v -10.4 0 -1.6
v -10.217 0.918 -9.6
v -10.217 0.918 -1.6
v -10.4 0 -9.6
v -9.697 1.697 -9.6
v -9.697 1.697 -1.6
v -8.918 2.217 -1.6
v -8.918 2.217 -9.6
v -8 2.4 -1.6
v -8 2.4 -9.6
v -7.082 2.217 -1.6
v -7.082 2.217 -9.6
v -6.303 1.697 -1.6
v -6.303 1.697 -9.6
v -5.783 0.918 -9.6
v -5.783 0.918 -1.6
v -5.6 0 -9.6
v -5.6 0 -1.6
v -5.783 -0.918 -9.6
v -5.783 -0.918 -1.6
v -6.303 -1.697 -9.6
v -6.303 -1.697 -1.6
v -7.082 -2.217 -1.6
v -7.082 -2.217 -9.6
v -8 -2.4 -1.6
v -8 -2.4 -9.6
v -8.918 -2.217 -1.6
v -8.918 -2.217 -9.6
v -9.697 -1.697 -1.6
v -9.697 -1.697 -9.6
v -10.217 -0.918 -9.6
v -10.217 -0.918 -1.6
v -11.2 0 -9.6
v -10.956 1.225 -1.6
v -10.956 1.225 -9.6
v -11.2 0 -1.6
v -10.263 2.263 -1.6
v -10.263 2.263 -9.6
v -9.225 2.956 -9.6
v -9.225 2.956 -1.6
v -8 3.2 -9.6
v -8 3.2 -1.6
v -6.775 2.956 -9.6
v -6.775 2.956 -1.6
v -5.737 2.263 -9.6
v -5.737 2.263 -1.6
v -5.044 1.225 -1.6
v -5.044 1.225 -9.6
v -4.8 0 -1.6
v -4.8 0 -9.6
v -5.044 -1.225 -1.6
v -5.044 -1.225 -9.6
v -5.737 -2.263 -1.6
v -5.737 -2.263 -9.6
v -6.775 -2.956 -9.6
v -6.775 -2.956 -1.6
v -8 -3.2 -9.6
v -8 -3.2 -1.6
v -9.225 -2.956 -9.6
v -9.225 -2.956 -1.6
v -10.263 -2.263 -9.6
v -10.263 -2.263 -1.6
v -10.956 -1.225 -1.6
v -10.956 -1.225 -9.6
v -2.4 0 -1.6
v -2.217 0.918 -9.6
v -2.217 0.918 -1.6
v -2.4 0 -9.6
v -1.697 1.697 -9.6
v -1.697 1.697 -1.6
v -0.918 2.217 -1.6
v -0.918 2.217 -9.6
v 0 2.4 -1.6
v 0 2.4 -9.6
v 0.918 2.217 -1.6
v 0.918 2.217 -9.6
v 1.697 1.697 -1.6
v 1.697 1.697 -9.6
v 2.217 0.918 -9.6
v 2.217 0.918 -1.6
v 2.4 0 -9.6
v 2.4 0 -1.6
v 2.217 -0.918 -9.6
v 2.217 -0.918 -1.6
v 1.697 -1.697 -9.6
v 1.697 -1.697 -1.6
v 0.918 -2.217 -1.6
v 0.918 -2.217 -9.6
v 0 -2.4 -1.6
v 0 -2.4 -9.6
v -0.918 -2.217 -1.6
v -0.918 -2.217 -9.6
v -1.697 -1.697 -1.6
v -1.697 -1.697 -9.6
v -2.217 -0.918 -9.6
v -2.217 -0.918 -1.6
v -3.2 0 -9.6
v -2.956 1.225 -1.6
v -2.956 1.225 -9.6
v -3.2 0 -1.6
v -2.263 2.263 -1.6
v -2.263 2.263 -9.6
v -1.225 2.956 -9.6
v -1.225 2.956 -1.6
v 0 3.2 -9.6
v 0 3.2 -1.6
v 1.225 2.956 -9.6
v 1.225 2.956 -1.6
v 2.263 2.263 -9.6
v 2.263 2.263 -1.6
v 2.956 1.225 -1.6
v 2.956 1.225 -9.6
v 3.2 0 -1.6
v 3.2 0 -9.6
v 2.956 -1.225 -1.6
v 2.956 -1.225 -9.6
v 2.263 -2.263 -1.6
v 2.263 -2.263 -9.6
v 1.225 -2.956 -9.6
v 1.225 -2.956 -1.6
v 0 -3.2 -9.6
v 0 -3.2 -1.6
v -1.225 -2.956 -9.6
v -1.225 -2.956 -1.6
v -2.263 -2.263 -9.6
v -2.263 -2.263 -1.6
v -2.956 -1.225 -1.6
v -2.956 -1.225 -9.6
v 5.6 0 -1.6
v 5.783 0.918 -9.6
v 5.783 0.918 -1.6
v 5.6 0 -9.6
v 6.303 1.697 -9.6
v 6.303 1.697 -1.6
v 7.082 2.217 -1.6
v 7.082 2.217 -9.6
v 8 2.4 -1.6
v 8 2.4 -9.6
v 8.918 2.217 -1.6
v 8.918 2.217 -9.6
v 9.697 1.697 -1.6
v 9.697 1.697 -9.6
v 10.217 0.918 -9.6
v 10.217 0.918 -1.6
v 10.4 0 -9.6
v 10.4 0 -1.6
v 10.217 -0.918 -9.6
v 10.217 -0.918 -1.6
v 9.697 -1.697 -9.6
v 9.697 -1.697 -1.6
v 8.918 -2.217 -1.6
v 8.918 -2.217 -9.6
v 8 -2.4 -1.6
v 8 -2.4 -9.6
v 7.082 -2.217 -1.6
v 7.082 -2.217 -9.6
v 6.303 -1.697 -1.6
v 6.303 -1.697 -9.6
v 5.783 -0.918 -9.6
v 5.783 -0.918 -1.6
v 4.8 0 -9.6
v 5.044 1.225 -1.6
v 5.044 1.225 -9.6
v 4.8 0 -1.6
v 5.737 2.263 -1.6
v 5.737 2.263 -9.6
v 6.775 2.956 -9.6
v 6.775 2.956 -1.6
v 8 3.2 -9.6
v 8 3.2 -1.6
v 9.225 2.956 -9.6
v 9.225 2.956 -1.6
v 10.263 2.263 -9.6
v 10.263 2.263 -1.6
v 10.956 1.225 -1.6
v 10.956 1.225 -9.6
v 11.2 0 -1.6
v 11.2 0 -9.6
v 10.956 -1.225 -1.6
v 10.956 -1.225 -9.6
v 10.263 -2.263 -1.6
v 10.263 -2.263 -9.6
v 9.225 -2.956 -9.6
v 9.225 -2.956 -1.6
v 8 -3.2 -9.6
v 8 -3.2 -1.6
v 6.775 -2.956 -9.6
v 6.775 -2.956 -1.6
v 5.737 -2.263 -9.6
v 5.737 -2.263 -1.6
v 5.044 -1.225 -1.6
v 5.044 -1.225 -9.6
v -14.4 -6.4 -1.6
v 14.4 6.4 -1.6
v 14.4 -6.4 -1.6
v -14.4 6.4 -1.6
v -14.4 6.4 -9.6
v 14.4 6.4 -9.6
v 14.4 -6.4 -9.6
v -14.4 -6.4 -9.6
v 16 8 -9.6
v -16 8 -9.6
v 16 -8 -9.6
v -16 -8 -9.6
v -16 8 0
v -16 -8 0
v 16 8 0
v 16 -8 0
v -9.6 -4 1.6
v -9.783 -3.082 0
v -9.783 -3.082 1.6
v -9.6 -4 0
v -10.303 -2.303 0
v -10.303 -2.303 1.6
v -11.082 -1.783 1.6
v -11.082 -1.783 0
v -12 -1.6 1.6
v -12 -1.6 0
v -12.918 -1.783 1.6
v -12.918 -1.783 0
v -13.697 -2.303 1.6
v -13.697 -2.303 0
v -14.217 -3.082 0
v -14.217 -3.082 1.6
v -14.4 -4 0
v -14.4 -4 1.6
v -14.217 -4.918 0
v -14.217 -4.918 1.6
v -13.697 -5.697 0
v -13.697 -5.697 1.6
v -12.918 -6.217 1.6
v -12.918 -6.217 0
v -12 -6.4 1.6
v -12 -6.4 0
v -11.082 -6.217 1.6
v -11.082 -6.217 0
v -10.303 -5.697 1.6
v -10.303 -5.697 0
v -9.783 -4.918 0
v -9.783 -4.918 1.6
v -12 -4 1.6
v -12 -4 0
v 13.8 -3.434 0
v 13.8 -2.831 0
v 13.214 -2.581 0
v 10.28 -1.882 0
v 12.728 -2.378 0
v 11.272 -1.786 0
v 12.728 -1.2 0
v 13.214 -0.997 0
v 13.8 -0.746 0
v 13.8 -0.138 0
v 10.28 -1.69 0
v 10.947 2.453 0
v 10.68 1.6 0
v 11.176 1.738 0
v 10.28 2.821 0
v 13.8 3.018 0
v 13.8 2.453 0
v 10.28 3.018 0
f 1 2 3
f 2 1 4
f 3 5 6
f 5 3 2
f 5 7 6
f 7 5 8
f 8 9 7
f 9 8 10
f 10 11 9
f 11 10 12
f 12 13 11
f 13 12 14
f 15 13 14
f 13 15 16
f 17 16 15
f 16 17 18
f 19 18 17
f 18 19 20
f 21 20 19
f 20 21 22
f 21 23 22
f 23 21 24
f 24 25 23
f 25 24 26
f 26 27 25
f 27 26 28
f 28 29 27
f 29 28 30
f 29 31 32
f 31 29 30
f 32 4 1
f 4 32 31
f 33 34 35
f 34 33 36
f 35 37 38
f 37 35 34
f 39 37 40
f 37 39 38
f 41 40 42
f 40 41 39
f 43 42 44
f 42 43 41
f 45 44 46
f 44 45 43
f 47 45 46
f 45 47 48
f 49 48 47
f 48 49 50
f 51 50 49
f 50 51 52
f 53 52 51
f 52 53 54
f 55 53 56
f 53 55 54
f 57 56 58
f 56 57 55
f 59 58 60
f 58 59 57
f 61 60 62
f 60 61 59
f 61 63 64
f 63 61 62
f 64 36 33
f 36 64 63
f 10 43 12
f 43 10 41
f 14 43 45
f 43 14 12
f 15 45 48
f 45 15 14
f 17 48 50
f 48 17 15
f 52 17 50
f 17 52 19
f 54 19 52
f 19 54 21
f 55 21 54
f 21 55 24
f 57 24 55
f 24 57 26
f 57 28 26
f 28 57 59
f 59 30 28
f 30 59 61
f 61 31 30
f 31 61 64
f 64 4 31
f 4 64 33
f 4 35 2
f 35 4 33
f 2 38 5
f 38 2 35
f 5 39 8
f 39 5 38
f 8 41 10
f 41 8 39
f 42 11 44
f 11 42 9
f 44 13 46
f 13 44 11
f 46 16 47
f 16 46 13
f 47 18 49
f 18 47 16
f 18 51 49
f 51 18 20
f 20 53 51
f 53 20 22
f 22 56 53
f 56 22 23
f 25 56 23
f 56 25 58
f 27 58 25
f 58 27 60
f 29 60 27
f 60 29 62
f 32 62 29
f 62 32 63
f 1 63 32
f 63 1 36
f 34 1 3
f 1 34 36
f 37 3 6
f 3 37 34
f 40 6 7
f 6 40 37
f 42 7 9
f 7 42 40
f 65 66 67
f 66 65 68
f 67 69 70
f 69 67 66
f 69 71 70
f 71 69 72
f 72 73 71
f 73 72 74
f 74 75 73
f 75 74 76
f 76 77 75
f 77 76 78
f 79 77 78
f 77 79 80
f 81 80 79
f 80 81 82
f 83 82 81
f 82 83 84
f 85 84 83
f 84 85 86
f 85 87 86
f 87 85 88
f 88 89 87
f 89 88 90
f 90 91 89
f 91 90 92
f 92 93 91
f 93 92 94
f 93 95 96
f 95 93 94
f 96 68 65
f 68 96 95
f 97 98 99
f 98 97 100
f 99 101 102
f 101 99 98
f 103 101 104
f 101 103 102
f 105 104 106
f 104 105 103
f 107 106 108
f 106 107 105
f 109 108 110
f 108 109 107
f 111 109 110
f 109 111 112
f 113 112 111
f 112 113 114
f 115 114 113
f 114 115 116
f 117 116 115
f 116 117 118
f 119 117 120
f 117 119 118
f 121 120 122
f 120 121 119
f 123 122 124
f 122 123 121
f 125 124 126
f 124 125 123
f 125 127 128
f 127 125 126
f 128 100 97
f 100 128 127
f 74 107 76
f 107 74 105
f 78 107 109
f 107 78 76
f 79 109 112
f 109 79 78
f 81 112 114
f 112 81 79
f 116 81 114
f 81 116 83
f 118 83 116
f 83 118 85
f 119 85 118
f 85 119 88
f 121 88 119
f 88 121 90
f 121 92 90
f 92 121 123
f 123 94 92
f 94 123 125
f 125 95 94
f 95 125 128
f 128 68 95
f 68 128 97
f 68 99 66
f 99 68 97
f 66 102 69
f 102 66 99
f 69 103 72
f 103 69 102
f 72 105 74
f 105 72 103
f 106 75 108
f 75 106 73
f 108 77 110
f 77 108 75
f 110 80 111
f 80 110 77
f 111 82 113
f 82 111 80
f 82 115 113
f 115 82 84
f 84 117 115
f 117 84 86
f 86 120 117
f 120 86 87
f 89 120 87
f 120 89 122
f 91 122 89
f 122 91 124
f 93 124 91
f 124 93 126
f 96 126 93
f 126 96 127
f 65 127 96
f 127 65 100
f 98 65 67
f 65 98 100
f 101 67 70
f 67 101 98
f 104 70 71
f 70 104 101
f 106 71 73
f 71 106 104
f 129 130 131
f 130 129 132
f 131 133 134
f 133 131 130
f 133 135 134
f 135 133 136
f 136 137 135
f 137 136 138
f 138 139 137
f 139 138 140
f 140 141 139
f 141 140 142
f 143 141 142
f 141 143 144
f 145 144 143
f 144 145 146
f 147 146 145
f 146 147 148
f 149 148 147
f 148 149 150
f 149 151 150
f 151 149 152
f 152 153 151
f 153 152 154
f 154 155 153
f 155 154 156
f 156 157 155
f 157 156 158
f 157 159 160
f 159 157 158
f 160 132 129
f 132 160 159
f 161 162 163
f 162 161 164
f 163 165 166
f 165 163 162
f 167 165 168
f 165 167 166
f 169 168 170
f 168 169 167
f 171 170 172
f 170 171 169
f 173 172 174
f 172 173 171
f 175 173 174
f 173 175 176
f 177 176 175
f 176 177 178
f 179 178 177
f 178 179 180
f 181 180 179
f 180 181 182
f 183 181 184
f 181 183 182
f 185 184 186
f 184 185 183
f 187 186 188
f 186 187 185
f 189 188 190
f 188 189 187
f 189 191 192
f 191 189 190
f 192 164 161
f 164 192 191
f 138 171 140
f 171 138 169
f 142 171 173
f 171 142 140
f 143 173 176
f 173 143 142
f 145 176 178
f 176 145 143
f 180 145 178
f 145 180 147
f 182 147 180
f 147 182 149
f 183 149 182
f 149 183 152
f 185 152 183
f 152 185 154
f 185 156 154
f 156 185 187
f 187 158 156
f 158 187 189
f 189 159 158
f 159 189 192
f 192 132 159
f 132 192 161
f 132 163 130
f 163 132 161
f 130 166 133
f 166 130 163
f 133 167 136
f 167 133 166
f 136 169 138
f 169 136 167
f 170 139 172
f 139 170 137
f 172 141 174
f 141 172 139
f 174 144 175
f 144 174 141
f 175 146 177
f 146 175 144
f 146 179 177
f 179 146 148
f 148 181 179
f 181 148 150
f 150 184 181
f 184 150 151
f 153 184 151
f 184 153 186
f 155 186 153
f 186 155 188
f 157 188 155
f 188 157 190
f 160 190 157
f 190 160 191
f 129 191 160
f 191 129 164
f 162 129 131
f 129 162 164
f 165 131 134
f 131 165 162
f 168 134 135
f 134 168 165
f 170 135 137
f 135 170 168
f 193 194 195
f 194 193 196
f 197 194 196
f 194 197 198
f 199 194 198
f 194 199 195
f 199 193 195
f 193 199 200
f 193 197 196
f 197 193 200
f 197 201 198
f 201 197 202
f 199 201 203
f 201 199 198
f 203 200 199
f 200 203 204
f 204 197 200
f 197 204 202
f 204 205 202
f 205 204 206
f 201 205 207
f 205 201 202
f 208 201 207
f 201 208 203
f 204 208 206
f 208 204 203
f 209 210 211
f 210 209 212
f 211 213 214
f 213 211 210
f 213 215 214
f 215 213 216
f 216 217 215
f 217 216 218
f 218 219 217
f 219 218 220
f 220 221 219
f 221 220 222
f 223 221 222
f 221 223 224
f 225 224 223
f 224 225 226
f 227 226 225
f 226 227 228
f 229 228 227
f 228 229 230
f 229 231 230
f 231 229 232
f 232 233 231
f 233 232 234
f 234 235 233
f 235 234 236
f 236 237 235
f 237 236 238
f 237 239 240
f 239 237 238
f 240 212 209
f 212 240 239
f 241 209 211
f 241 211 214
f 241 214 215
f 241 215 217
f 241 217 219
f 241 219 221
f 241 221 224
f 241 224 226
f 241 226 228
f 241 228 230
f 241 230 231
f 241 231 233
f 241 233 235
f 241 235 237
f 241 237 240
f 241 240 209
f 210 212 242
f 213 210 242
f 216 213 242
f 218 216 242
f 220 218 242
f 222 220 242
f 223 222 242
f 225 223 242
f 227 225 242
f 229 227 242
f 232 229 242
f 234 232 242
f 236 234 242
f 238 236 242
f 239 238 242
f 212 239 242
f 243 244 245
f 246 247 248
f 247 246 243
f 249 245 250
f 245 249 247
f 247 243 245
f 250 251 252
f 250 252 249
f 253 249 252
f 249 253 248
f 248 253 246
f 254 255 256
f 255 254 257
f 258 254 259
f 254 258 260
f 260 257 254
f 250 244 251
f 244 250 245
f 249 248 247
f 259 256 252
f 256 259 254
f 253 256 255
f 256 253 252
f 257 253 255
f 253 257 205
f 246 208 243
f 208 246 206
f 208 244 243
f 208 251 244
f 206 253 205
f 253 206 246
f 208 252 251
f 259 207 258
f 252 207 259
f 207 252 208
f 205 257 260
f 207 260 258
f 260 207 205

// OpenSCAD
// file: ../p/4-4ring3.scad
use <../lib.scad>
$fa=1; $fs=0.2;
function ldraw_lib__4_4ring3(realsolid=false) = [
// 0 Ring  3 x 1.0
// 0 Name: 4-4ring3.dat
// 0 Author: James Jessiman
// 0 !LDRAW_ORG Primitive UPDATE 2009-01
// 0 !LICENSE Licensed under CC BY 2.0 and CC BY 4.0 : see CAreadme.txt
// 
// 0 BFC CERTIFY CCW
  [0,"BFC","CERTIFY"],
  [0,"BFC","CCW"],
// 
// 0 !HISTORY 1998-12-15 [PTadmin] Official Update 1998-10
// 0 !HISTORY 2002-04-05 [hafhead] Added BFC statement
// 0 !HISTORY 2002-04-25 [PTadmin] Official Update 2002-02
// 0 !HISTORY 2007-06-24 [PTadmin] Header formatted for Contributor Agreement
// 0 !HISTORY 2008-07-01 [PTadmin] Official Update 2008-01
// 0 !HISTORY 2008-08-26 [cwdee] Switch polygon winding and rename
// 0 !HISTORY 2009-05-02 [PTadmin] Official Update 2009-01
// 
// 
// 4 16 -1.5308 0 3.6956 -1.1481 0 2.7717 0 0 3 0 0 4
  [4,16,-1.5308,0,3.6956,-1.1481,0,2.7717,0,0,3,0,0,4],
// 4 16 -2.8284 0 2.8284 -2.1213 0 2.1213 -1.1481 0 2.7717 -1.5308 0 3.6956
  [4,16,-2.8284,0,2.8284,-2.1213,0,2.1213,-1.1481,0,2.7717,-1.5308,0,3.6956],
// 4 16 -3.6956 0 1.5308 -2.7717 0 1.1481 -2.1213 0 2.1213 -2.8284 0 2.8284
  [4,16,-3.6956,0,1.5308,-2.7717,0,1.1481,-2.1213,0,2.1213,-2.8284,0,2.8284],
// 4 16 -4 0 0 -3 0 0 -2.7717 0 1.1481 -3.6956 0 1.5308
  [4,16,-4,0,0,-3,0,0,-2.7717,0,1.1481,-3.6956,0,1.5308],
// 4 16 -3.6956 0 -1.5308 -2.7717 0 -1.1481 -3 0 0 -4 0 0
  [4,16,-3.6956,0,-1.5308,-2.7717,0,-1.1481,-3,0,0,-4,0,0],
// 4 16 -2.8284 0 -2.8284 -2.1213 0 -2.1213 -2.7717 0 -1.1481 -3.6956 0 -1.5308
  [4,16,-2.8284,0,-2.8284,-2.1213,0,-2.1213,-2.7717,0,-1.1481,-3.6956,0,-1.5308],
// 4 16 -1.5308 0 -3.6956 -1.1481 0 -2.7717 -2.1213 0 -2.1213 -2.8284 0 -2.8284
  [4,16,-1.5308,0,-3.6956,-1.1481,0,-2.7717,-2.1213,0,-2.1213,-2.8284,0,-2.8284],
// 4 16 0 0 -4 0 0 -3 -1.1481 0 -2.7717 -1.5308 0 -3.6956
  [4,16,0,0,-4,0,0,-3,-1.1481,0,-2.7717,-1.5308,0,-3.6956],
// 4 16 1.5308 0 -3.6956 1.1481 0 -2.7717 0 0 -3 0 0 -4
  [4,16,1.5308,0,-3.6956,1.1481,0,-2.7717,0,0,-3,0,0,-4],
// 4 16 2.8284 0 -2.8284 2.1213 0 -2.1213 1.1481 0 -2.7717 1.5308 0 -3.6956
  [4,16,2.8284,0,-2.8284,2.1213,0,-2.1213,1.1481,0,-2.7717,1.5308,0,-3.6956],
// 4 16 3.6956 0 -1.5308 2.7717 0 -1.1481 2.1213 0 -2.1213 2.8284 0 -2.8284
  [4,16,3.6956,0,-1.5308,2.7717,0,-1.1481,2.1213,0,-2.1213,2.8284,0,-2.8284],
// 4 16 4 0 0 3 0 0 2.7717 0 -1.1481 3.6956 0 -1.5308
  [4,16,4,0,0,3,0,0,2.7717,0,-1.1481,3.6956,0,-1.5308],
// 4 16 3.6956 0 1.5308 2.7717 0 1.1481 3 0 0 4 0 0
  [4,16,3.6956,0,1.5308,2.7717,0,1.1481,3,0,0,4,0,0],
// 4 16 2.8284 0 2.8284 2.1213 0 2.1213 2.7717 0 1.1481 3.6956 0 1.5308
  [4,16,2.8284,0,2.8284,2.1213,0,2.1213,2.7717,0,1.1481,3.6956,0,1.5308],
// 4 16 1.5308 0 3.6956 1.1481 0 2.7717 2.1213 0 2.1213 2.8284 0 2.8284
  [4,16,1.5308,0,3.6956,1.1481,0,2.7717,2.1213,0,2.1213,2.8284,0,2.8284],
// 4 16 0 0 4 0 0 3 1.1481 0 2.7717 1.5308 0 3.6956
  [4,16,0,0,4,0,0,3,1.1481,0,2.7717,1.5308,0,3.6956],
// 0
];
module ldraw_lib__4_4ring3(step=0, col=false, unit=2/5, alt=false, line=0.2, solid=!$preview)
    makepoly(ldraw_lib__4_4ring3(solid), step=step, col=col, unit=unit, alt=alt, line=line, solid=solid);
ldraw_lib__4_4ring3(line=0.2);
// file: ../p/4-4edge.scad
use <../lib.scad>
function ldraw_lib__4_4edge() = [
// 0 Circle 1.0
// 0 Name: 4-4edge.dat
// 0 Author: James Jessiman
// 0 !LDRAW_ORG Primitive UPDATE 2017-01
// 0 !LICENSE Licensed under CC BY 2.0 and CC BY 4.0 : see CAreadme.txt
// 
// 0 BFC CERTIFY CCW
  [0,"BFC","CERTIFY"],
  [0,"BFC","CCW"],
// 
// 0 !HISTORY 1998-12-15 [PTadmin] Official Update 1998-10
// 0 !HISTORY 2005-12-28 [PTadmin] Official Update 2005-01
// 0 !HISTORY 2007-06-24 [PTadmin] Header formatted for Contributor Agreement
// 0 !HISTORY 2008-07-01 [PTadmin] Official Update 2008-01
// 0 !HISTORY 2017-01-15 [Steffen] BFCed
// 0 !HISTORY 2017-12-30 [PTadmin] Official Update 2017-01
// 
// 
// 2 24 1 0 0 0.9239 0 0.3827
  [2,24,1,0,0,0.9239,0,0.3827],
// 2 24 0.9239 0 0.3827 0.7071 0 0.7071
  [2,24,0.9239,0,0.3827,0.7071,0,0.7071],
// 2 24 0.7071 0 0.7071 0.3827 0 0.9239
  [2,24,0.7071,0,0.7071,0.3827,0,0.9239],
// 2 24 0.3827 0 0.9239 0 0 1
  [2,24,0.3827,0,0.9239,0,0,1],
// 2 24 0 0 1 -0.3827 0 0.9239
  [2,24,0,0,1,-0.3827,0,0.9239],
// 2 24 -0.3827 0 0.9239 -0.7071 0 0.7071
  [2,24,-0.3827,0,0.9239,-0.7071,0,0.7071],
// 2 24 -0.7071 0 0.7071 -0.9239 0 0.3827
  [2,24,-0.7071,0,0.7071,-0.9239,0,0.3827],
// 2 24 -0.9239 0 0.3827 -1 0 -0
  [2,24,-0.9239,0,0.3827,-1,0,-0],
// 2 24 -1 0 -0 -0.9239 0 -0.3827
  [2,24,-1,0,-0,-0.9239,0,-0.3827],
// 2 24 -0.9239 0 -0.3827 -0.7071 0 -0.7071
  [2,24,-0.9239,0,-0.3827,-0.7071,0,-0.7071],
// 2 24 -0.7071 0 -0.7071 -0.3827 0 -0.9239
  [2,24,-0.7071,0,-0.7071,-0.3827,0,-0.9239],
// 2 24 -0.3827 0 -0.9239 0 0 -1
  [2,24,-0.3827,0,-0.9239,0,0,-1],
// 2 24 0 0 -1 0.3827 0 -0.9239
  [2,24,0,0,-1,0.3827,0,-0.9239],
// 2 24 0.3827 0 -0.9239 0.7071 0 -0.7071
  [2,24,0.3827,0,-0.9239,0.7071,0,-0.7071],
// 2 24 0.7071 0 -0.7071 0.9239 0 -0.3827
  [2,24,0.7071,0,-0.7071,0.9239,0,-0.3827],
// 2 24 0.9239 0 -0.3827 1 0 0
  [2,24,0.9239,0,-0.3827,1,0,0],
];
module ldraw_lib__4_4edge(step=0, col=false, unit=2/5, alt=false, line=0.2, solid=!$preview)
    makepoly(ldraw_lib__4_4edge(), step=step, col=col, unit=unit, alt=alt, line=line, solid=solid);
ldraw_lib__4_4edge(line=0.2);
// file: ../p/4-4disc.scad
use <../lib.scad>
function ldraw_lib__4_4disc() = [
// 0 Disc 1.0
// 0 Name: 4-4disc.dat
// 0 Author: James Jessiman
// 0 !LDRAW_ORG Primitive UPDATE 2002-02
// 0 !LICENSE Licensed under CC BY 2.0 and CC BY 4.0 : see CAreadme.txt
// 
// 0 BFC CERTIFY CCW
  [0,"BFC","CERTIFY"],
  [0,"BFC","CCW"],
// 
// 0 !HISTORY 1998-12-15 [PTadmin] Official Update 1998-10
// 0 !HISTORY 2002-03-23 [sbliss] Added BFC statement
// 0 !HISTORY 2002-04-25 [PTadmin] Official Update 2002-02
// 0 !HISTORY 2007-06-24 [PTadmin] Header formatted for Contributor Agreement
// 0 !HISTORY 2008-07-01 [PTadmin] Official Update 2008-01
// 
// 
// 3 16 0 0 0 1 0 0 0.9239 0 0.3827
  [3,16,0,0,0,1,0,0,0.9239,0,0.3827],
// 3 16 0 0 0 0.9239 0 0.3827 0.7071 0 0.7071
  [3,16,0,0,0,0.9239,0,0.3827,0.7071,0,0.7071],
// 3 16 0 0 0 0.7071 0 0.7071 0.3827 0 0.9239
  [3,16,0,0,0,0.7071,0,0.7071,0.3827,0,0.9239],
// 3 16 0 0 0 0.3827 0 0.9239 0 0 1
  [3,16,0,0,0,0.3827,0,0.9239,0,0,1],
// 3 16 0 0 0 0 0 1 -0.3827 0 0.9239
  [3,16,0,0,0,0,0,1,-0.3827,0,0.9239],
// 3 16 0 0 0 -0.3827 0 0.9239 -0.7071 0 0.7071
  [3,16,0,0,0,-0.3827,0,0.9239,-0.7071,0,0.7071],
// 3 16 0 0 0 -0.7071 0 0.7071 -0.9239 0 0.3827
  [3,16,0,0,0,-0.7071,0,0.7071,-0.9239,0,0.3827],
// 3 16 0 0 0 -0.9239 0 0.3827 -1 0 -0
  [3,16,0,0,0,-0.9239,0,0.3827,-1,0,-0],
// 3 16 0 0 0 -1 0 -0 -0.9239 0 -0.3827
  [3,16,0,0,0,-1,0,-0,-0.9239,0,-0.3827],
// 3 16 0 0 0 -0.9239 0 -0.3827 -0.7071 0 -0.7071
  [3,16,0,0,0,-0.9239,0,-0.3827,-0.7071,0,-0.7071],
// 3 16 0 0 0 -0.7071 0 -0.7071 -0.3827 0 -0.9239
  [3,16,0,0,0,-0.7071,0,-0.7071,-0.3827,0,-0.9239],
// 3 16 0 0 0 -0.3827 0 -0.9239 0 0 -1
  [3,16,0,0,0,-0.3827,0,-0.9239,0,0,-1],
// 3 16 0 0 0 0 0 -1 0.3827 0 -0.9239
  [3,16,0,0,0,0,0,-1,0.3827,0,-0.9239],
// 3 16 0 0 0 0.3827 0 -0.9239 0.7071 0 -0.7071
  [3,16,0,0,0,0.3827,0,-0.9239,0.7071,0,-0.7071],
// 3 16 0 0 0 0.7071 0 -0.7071 0.9239 0 -0.3827
  [3,16,0,0,0,0.7071,0,-0.7071,0.9239,0,-0.3827],
// 3 16 0 0 0 0.9239 0 -0.3827 1 0 0
  [3,16,0,0,0,0.9239,0,-0.3827,1,0,0],
// 0
];
module ldraw_lib__4_4disc(step=0, col=false, unit=2/5, alt=false, line=0.2, solid=!$preview)
    makepoly(ldraw_lib__4_4disc(), step=step, col=col, unit=unit, alt=alt, line=line, solid=solid);
ldraw_lib__4_4disc(line=0.2);
// file: ../p/4-4cyli.scad
use <../lib.scad>
$fa=1; $fs=0.2;
function ldraw_lib__4_4cyli(realsolid=false) = [
// 0 Cylinder 1.0
// 0 Name: 4-4cyli.dat
// 0 Author: James Jessiman
// 0 !LDRAW_ORG Primitive UPDATE 2005-01
// 0 !LICENSE Licensed under CC BY 2.0 and CC BY 4.0 : see CAreadme.txt
// 
// 0 BFC CERTIFY CCW
  [0,"BFC","CERTIFY"],
  [0,"BFC","CCW"],
// 
// 0 !HISTORY 1998-12-15 [PTadmin] Official Update 1998-10
// 0 !HISTORY 2002-03-23 [sbliss] Added BFC statement; merged headers from files in distributions LDraw 0.27 and Complete.
// 0 !HISTORY 2002-04-25 [PTadmin] Official Update 2002-02
// 0 !HISTORY 2004-12-14 [guyvivan] BFC CCW
// 0 !HISTORY 2005-12-28 [PTadmin] Official Update 2005-01
// 0 !HISTORY 2007-06-24 [PTadmin] Header formatted for Contributor Agreement
// 0 !HISTORY 2008-07-01 [PTadmin] Official Update 2008-01
// 
// 
// 4 16 1 1 0 0.9239 1 0.3827 0.9239 0 0.3827 1 0 0
  [4,16,1,1,0,0.9239,1,0.3827,0.9239,0,0.3827,1,0,0],
// 5 24 1 0 0 1 1 0 0.9239 0 0.3827 0.9239 0 -0.3827
  [5,24,1,0,0,1,1,0,0.9239,0,0.3827,0.9239,0,-0.3827],
// 4 16 0.9239 1 0.3827 0.7071 1 0.7071 0.7071 0 0.7071 0.9239 0 0.3827
  [4,16,0.9239,1,0.3827,0.7071,1,0.7071,0.7071,0,0.7071,0.9239,0,0.3827],
// 5 24 0.9239 0 0.3827 0.9239 1 0.3827 0.7071 0 0.7071 1 0 0
  [5,24,0.9239,0,0.3827,0.9239,1,0.3827,0.7071,0,0.7071,1,0,0],
// 4 16 0.7071 1 0.7071 0.3827 1 0.9239 0.3827 0 0.9239 0.7071 0 0.7071
  [4,16,0.7071,1,0.7071,0.3827,1,0.9239,0.3827,0,0.9239,0.7071,0,0.7071],
// 5 24 0.7071 0 0.7071 0.7071 1 0.7071 0.3827 0 0.9239 0.9239 0 0.3827
  [5,24,0.7071,0,0.7071,0.7071,1,0.7071,0.3827,0,0.9239,0.9239,0,0.3827],
// 4 16 0.3827 1 0.9239 0 1 1 0 0 1 0.3827 0 0.9239
  [4,16,0.3827,1,0.9239,0,1,1,0,0,1,0.3827,0,0.9239],
// 5 24 0.3827 0 0.9239 0.3827 1 0.9239 0 0 1 0.7071 0 0.7071
  [5,24,0.3827,0,0.9239,0.3827,1,0.9239,0,0,1,0.7071,0,0.7071],
// 4 16 0 1 1 -0.3827 1 0.9239 -0.3827 0 0.9239 0 0 1
  [4,16,0,1,1,-0.3827,1,0.9239,-0.3827,0,0.9239,0,0,1],
// 5 24 0 0 1 0 1 1 -0.3827 0 0.9239 0.3827 0 0.9239
  [5,24,0,0,1,0,1,1,-0.3827,0,0.9239,0.3827,0,0.9239],
// 4 16 -0.3827 1 0.9239 -0.7071 1 0.7071 -0.7071 0 0.7071 -0.3827 0 0.9239
  [4,16,-0.3827,1,0.9239,-0.7071,1,0.7071,-0.7071,0,0.7071,-0.3827,0,0.9239],
// 5 24 -0.3827 0 0.9239 -0.3827 1 0.9239 -0.7071 0 0.7071 0 0 1
  [5,24,-0.3827,0,0.9239,-0.3827,1,0.9239,-0.7071,0,0.7071,0,0,1],
// 4 16 -0.7071 1 0.7071 -0.9239 1 0.3827 -0.9239 0 0.3827 -0.7071 0 0.7071
  [4,16,-0.7071,1,0.7071,-0.9239,1,0.3827,-0.9239,0,0.3827,-0.7071,0,0.7071],
// 5 24 -0.7071 0 0.7071 -0.7071 1 0.7071 -0.9239 0 0.3827 -0.3827 0 0.9239
  [5,24,-0.7071,0,0.7071,-0.7071,1,0.7071,-0.9239,0,0.3827,-0.3827,0,0.9239],
// 4 16 -0.9239 1 0.3827 -1 1 0 -1 0 0 -0.9239 0 0.3827
  [4,16,-0.9239,1,0.3827,-1,1,0,-1,0,0,-0.9239,0,0.3827],
// 5 24 -0.9239 0 0.3827 -0.9239 1 0.3827 -1 0 0 -0.7071 0 0.7071
  [5,24,-0.9239,0,0.3827,-0.9239,1,0.3827,-1,0,0,-0.7071,0,0.7071],
// 4 16 -1 1 0 -0.9239 1 -0.3827 -0.9239 0 -0.3827 -1 0 0
  [4,16,-1,1,0,-0.9239,1,-0.3827,-0.9239,0,-0.3827,-1,0,0],
// 5 24 -1 0 0 -1 1 0 -0.9239 0 -0.3827 -0.9239 0 0.3827
  [5,24,-1,0,0,-1,1,0,-0.9239,0,-0.3827,-0.9239,0,0.3827],
// 4 16 -0.9239 1 -0.3827 -0.7071 1 -0.7071 -0.7071 0 -0.7071 -0.9239 0 -0.3827
  [4,16,-0.9239,1,-0.3827,-0.7071,1,-0.7071,-0.7071,0,-0.7071,-0.9239,0,-0.3827],
// 5 24 -0.9239 0 -0.3827 -0.9239 1 -0.3827 -0.7071 0 -0.7071 -1 0 0
  [5,24,-0.9239,0,-0.3827,-0.9239,1,-0.3827,-0.7071,0,-0.7071,-1,0,0],
// 4 16 -0.7071 1 -0.7071 -0.3827 1 -0.9239 -0.3827 0 -0.9239 -0.7071 0 -0.7071
  [4,16,-0.7071,1,-0.7071,-0.3827,1,-0.9239,-0.3827,0,-0.9239,-0.7071,0,-0.7071],
// 5 24 -0.7071 0 -0.7071 -0.7071 1 -0.7071 -0.3827 0 -0.9239 -0.9239 0 -0.3827
  [5,24,-0.7071,0,-0.7071,-0.7071,1,-0.7071,-0.3827,0,-0.9239,-0.9239,0,-0.3827],
// 4 16 -0.3827 1 -0.9239 0 1 -1 0 0 -1 -0.3827 0 -0.9239
  [4,16,-0.3827,1,-0.9239,0,1,-1,0,0,-1,-0.3827,0,-0.9239],
// 5 24 -0.3827 0 -0.9239 -0.3827 1 -0.9239 0 0 -1 -0.7071 0 -0.7071
  [5,24,-0.3827,0,-0.9239,-0.3827,1,-0.9239,0,0,-1,-0.7071,0,-0.7071],
// 4 16 0 1 -1 0.3827 1 -0.9239 0.3827 0 -0.9239 0 0 -1
  [4,16,0,1,-1,0.3827,1,-0.9239,0.3827,0,-0.9239,0,0,-1],
// 5 24 0 0 -1 0 1 -1 0.3827 0 -0.9239 -0.3827 0 -0.9239
  [5,24,0,0,-1,0,1,-1,0.3827,0,-0.9239,-0.3827,0,-0.9239],
// 4 16 0.3827 1 -0.9239 0.7071 1 -0.7071 0.7071 0 -0.7071 0.3827 0 -0.9239
  [4,16,0.3827,1,-0.9239,0.7071,1,-0.7071,0.7071,0,-0.7071,0.3827,0,-0.9239],
// 5 24 0.3827 0 -0.9239 0.3827 1 -0.9239 0.7071 0 -0.7071 0 0 -1
  [5,24,0.3827,0,-0.9239,0.3827,1,-0.9239,0.7071,0,-0.7071,0,0,-1],
// 4 16 0.7071 1 -0.7071 0.9239 1 -0.3827 0.9239 0 -0.3827 0.7071 0 -0.7071
  [4,16,0.7071,1,-0.7071,0.9239,1,-0.3827,0.9239,0,-0.3827,0.7071,0,-0.7071],
// 5 24 0.7071 0 -0.7071 0.7071 1 -0.7071 0.9239 0 -0.3827 0.3827 0 -0.9239
  [5,24,0.7071,0,-0.7071,0.7071,1,-0.7071,0.9239,0,-0.3827,0.3827,0,-0.9239],
// 4 16 0.9239 1 -0.3827 1 1 0 1 0 0 0.9239 0 -0.3827
  [4,16,0.9239,1,-0.3827,1,1,0,1,0,0,0.9239,0,-0.3827],
// 5 24 0.9239 0 -0.3827 0.9239 1 -0.3827 1 0 0 0.7071 0 -0.7071
  [5,24,0.9239,0,-0.3827,0.9239,1,-0.3827,1,0,0,0.7071,0,-0.7071],
// 0
];
module ldraw_lib__4_4cyli(step=0, col=false, unit=2/5, alt=false, line=0.2, solid=!$preview)
    makepoly(ldraw_lib__4_4cyli(solid), step=step, col=col, unit=unit, alt=alt, line=line, solid=solid);
ldraw_lib__4_4cyli(line=0.2);
// file: ../p/stud4.scad
use <../lib.scad>
use <4-4cyli.scad>
use <4-4edge.scad>
use <4-4ring3.scad>
function ldraw_lib__stud4() = [
// 0 Stud Tube Open
// 0 Name: stud4.dat
// 0 Author: James Jessiman
// 0 !LDRAW_ORG Primitive UPDATE 2009-02
// 0 !LICENSE Licensed under CC BY 4.0 : see CAreadme.txt
// 
// 0 BFC CERTIFY CCW
  [0,"BFC","CERTIFY"],
  [0,"BFC","CCW"],
// 
// 0 !HISTORY 1999-07-05 [PTadmin] Official Update 1999-05
// 0 !HISTORY 2002-04-04 [sbliss] Modified for BFC compliance
// 0 !HISTORY 2002-04-25 [PTadmin] Official Update 2002-02
// 0 !HISTORY 2007-06-24 [PTadmin] Header formatted for Contributor Agreement
// 0 !HISTORY 2008-07-01 [PTadmin] Official Update 2008-01
// 0 !HISTORY 2009-06-21 [cwdee] Update ring references to 4-4ring
// 0 !HISTORY 2009-09-03 [PTadmin] Official Update 2009-02
// 
// 
// 1 16 0 -4 0 6 0 0 0 1 0 0 0 6 4-4edge.dat
  [1,16,0,-4,0,6,0,0,0,1,0,0,0,6, ldraw_lib__4_4edge()],
// 1 16 0 -4 0 8 0 0 0 1 0 0 0 8 4-4edge.dat
  [1,16,0,-4,0,8,0,0,0,1,0,0,0,8, ldraw_lib__4_4edge()],
// 1 16 0 0 0 6 0 0 0 1 0 0 0 6 4-4edge.dat
  [1,16,0,0,0,6,0,0,0,1,0,0,0,6, ldraw_lib__4_4edge()],
// 1 16 0 0 0 8 0 0 0 1 0 0 0 8 4-4edge.dat
  [1,16,0,0,0,8,0,0,0,1,0,0,0,8, ldraw_lib__4_4edge()],
// 0 BFC INVERTNEXT
  [0,"BFC","INVERTNEXT"],
// 1 16 0 -4 0 6 0 0 0 4 0 0 0 6 4-4cyli.dat
  [1,16,0,-4,0,6,0,0,0,4,0,0,0,6, ldraw_lib__4_4cyli()],
// 1 16 0 -4 0 8 0 0 0 4 0 0 0 8 4-4cyli.dat
  [1,16,0,-4,0,8,0,0,0,4,0,0,0,8, ldraw_lib__4_4cyli()],
// 1 16 0 -4 0 2 0 0 0 1 0 0 0 2 4-4ring3.dat
  [1,16,0,-4,0,2,0,0,0,1,0,0,0,2, ldraw_lib__4_4ring3()],
  [-1,16,0,0,0,2,0,0,0,-1,0,0,0,2, ldraw_lib__4_4ring3()],
// 0
];
module ldraw_lib__stud4(step=0, col=false, unit=2/5, alt=false, line=0.2, solid=!$preview)
    makepoly(ldraw_lib__stud4(), step=step, col=col, unit=unit, alt=alt, line=line, solid=solid);
ldraw_lib__stud4(line=0.2);
// file: ../p/box5.scad
use <../lib.scad>
function ldraw_lib__box5() = [
// 0 Box with 5 Faces and All Edges
// 0 Name: box5.dat
// 0 Author: James Jessiman
// 0 !LDRAW_ORG Primitive UPDATE 2012-01
// 0 !LICENSE Licensed under CC BY 2.0 and CC BY 4.0 : see CAreadme.txt
// 
// 0 BFC CERTIFY CCW
  [0,"BFC","CERTIFY"],
  [0,"BFC","CCW"],
// 
// 0 !HISTORY 2002-04-03 [sbliss] Modified for BFC compliance
// 0 !HISTORY 2002-04-25 [PTadmin] Official Update 2002-02
// 0 !HISTORY 2007-06-24 [PTadmin] Header formatted for Contributor Agreement
// 0 !HISTORY 2008-07-01 [PTadmin] Official Update 2008-01
// 0 !HISTORY 2012-02-16 [Philo] Changed to CCW
// 0 !HISTORY 2012-03-30 [PTadmin] Official Update 2012-01
// 
// 
// 2 24 1 1 1 -1 1 1
  [2,24,1,1,1,-1,1,1],
// 2 24 -1 1 1 -1 1 -1
  [2,24,-1,1,1,-1,1,-1],
// 2 24 -1 1 -1 1 1 -1
  [2,24,-1,1,-1,1,1,-1],
// 2 24 1 1 -1 1 1 1
  [2,24,1,1,-1,1,1,1],
// 2 24 1 0 1 -1 0 1
  [2,24,1,0,1,-1,0,1],
// 2 24 -1 0 1 -1 0 -1
  [2,24,-1,0,1,-1,0,-1],
// 2 24 -1 0 -1 1 0 -1
  [2,24,-1,0,-1,1,0,-1],
// 2 24 1 0 -1 1 0 1
  [2,24,1,0,-1,1,0,1],
// 2 24 1 0 1 1 1 1
  [2,24,1,0,1,1,1,1],
// 2 24 -1 0 1 -1 1 1
  [2,24,-1,0,1,-1,1,1],
// 2 24 1 0 -1 1 1 -1
  [2,24,1,0,-1,1,1,-1],
// 2 24 -1 0 -1 -1 1 -1
  [2,24,-1,0,-1,-1,1,-1],
// 4 16 -1 1 1 1 1 1 1 1 -1 -1 1 -1
  [4,16,-1,1,1,1,1,1,1,1,-1,-1,1,-1],
// 4 16 -1 1 1 -1 0 1 1 0 1 1 1 1
  [4,16,-1,1,1,-1,0,1,1,0,1,1,1,1],
// 4 16 -1 1 -1 -1 0 -1 -1 0 1 -1 1 1
  [4,16,-1,1,-1,-1,0,-1,-1,0,1,-1,1,1],
// 4 16 1 1 -1 1 0 -1 -1 0 -1 -1 1 -1
  [4,16,1,1,-1,1,0,-1,-1,0,-1,-1,1,-1],
// 4 16 1 1 1 1 0 1 1 0 -1 1 1 -1
  [4,16,1,1,1,1,0,1,1,0,-1,1,1,-1],
];
makepoly(ldraw_lib__box5(), line=0.2);
// file: ../p/box4.scad
use <../lib.scad>
function ldraw_lib__box4() = [
// 0 Box with 4 Faces (2 Parallel Pairs) and All Edges
// 0 Name: box4.dat
// 0 Author: James Jessiman
// 0 !LDRAW_ORG Primitive UPDATE 2012-01
// 0 !LICENSE Licensed under CC BY 4.0 : see CAreadme.txt
// 
// 0 BFC CERTIFY CCW
  [0,"BFC","CERTIFY"],
  [0,"BFC","CCW"],
// 
// 0 !HISTORY 2002-04-03 [sbliss] Modified for BFC compliance
// 0 !HISTORY 2002-04-25 [PTadmin] Official Update 2002-02
// 0 !HISTORY 2007-06-24 [PTadmin] Header formatted for Contributor Agreement
// 0 !HISTORY 2008-07-01 [PTadmin] Official Update 2008-01
// 0 !HISTORY 2012-02-16 [Philo] Changed to CCW
// 0 !HISTORY 2012-03-30 [PTadmin] Official Update 2012-01
// 
// 
// 2 24 1 1 1 -1 1 1
  [2,24,1,1,1,-1,1,1],
// 2 24 -1 1 1 -1 1 -1
  [2,24,-1,1,1,-1,1,-1],
// 2 24 -1 1 -1 1 1 -1
  [2,24,-1,1,-1,1,1,-1],
// 2 24 1 1 -1 1 1 1
  [2,24,1,1,-1,1,1,1],
// 2 24 1 0 1 -1 0 1
  [2,24,1,0,1,-1,0,1],
// 2 24 -1 0 1 -1 0 -1
  [2,24,-1,0,1,-1,0,-1],
// 2 24 -1 0 -1 1 0 -1
  [2,24,-1,0,-1,1,0,-1],
// 2 24 1 0 -1 1 0 1
  [2,24,1,0,-1,1,0,1],
// 2 24 1 0 1 1 1 1
  [2,24,1,0,1,1,1,1],
// 2 24 -1 0 1 -1 1 1
  [2,24,-1,0,1,-1,1,1],
// 2 24 1 0 -1 1 1 -1
  [2,24,1,0,-1,1,1,-1],
// 2 24 -1 0 -1 -1 1 -1
  [2,24,-1,0,-1,-1,1,-1],
// 4 16 -1 1 1 -1 0 1 1 0 1 1 1 1
  [4,16,-1,1,1,-1,0,1,1,0,1,1,1,1],
// 4 16 -1 1 -1 -1 0 -1 -1 0 1 -1 1 1
  [4,16,-1,1,-1,-1,0,-1,-1,0,1,-1,1,1],
// 4 16 1 1 -1 1 0 -1 -1 0 -1 -1 1 -1
  [4,16,1,1,-1,1,0,-1,-1,0,-1,-1,1,-1],
// 4 16 1 1 1 1 0 1 1 0 -1 1 1 -1
  [4,16,1,1,1,1,0,1,1,0,-1,1,1,-1],
];
module ldraw_lib__box4(step=0, col=false, unit=2/5, alt=false, line=0.2, solid=!$preview)
    makepoly(ldraw_lib__box4(), step=step, col=col, unit=unit, alt=alt, line=line, solid=solid);
ldraw_lib__box4(line=0.2);
// file: ../p/stud.scad
use <../lib.scad>
use <4-4cyli.scad>
use <4-4disc.scad>
use <4-4edge.scad>
function ldraw_lib__stud() = [
// 0 Stud
// 0 Name: stud.dat
// 0 Author: James Jessiman
// 0 !LDRAW_ORG Primitive UPDATE 2012-01
// 0 !LICENSE Licensed under CC BY 4.0 : see CAreadme.txt
// 
// 0 BFC CERTIFY CCW
  [0,"BFC","CERTIFY"],
  [0,"BFC","CCW"],
// 
// 0 !HISTORY 2002-04-04 [sbliss] Modified for BFC compliance
// 0 !HISTORY 2002-04-25 [PTadmin] Official Update 2002-02
// 0 !HISTORY 2007-06-24 [PTadmin] Header formatted for Contributor Agreement
// 0 !HISTORY 2008-07-01 [PTadmin] Official Update 2008-01
// 0 !HISTORY 2012-02-16 [Philo] Changed to CCW
// 0 !HISTORY 2012-03-30 [PTadmin] Official Update 2012-01
// 
// 
// 1 16 0 0 0 6 0 0 0 1 0 0 0 6 4-4edge.dat
  [1,16,0,0,0,6,0,0,0,1,0,0,0,6, ldraw_lib__4_4edge()],
// 1 16 0 -4 0 6 0 0 0 1 0 0 0 6 4-4edge.dat
  [1,16,0,-4,0,6,0,0,0,1,0,0,0,6, ldraw_lib__4_4edge()],
// 1 16 0 0 0 6 0 0 0 -4 0 0 0 6 4-4cyli.dat
  [1,16,0,0,0,6,0,0,0,-4,0,0,0,6, ldraw_lib__4_4cyli()],
// 1 16 0 -4 0 6 0 0 0 1 0 0 0 6 4-4disc.dat
  [1,16,0,-4,0,6,0,0,0,1,0,0,0,6, ldraw_lib__4_4disc()],
  [-1,16,0,0,0,6,0,0,0,-1,0,0,0,6, ldraw_lib__4_4disc()],
];
module ldraw_lib__stud(step=0, col=false, unit=2/5, alt=false, line=0.2, solid=!$preview)
    makepoly(ldraw_lib__stud(), step=step, col=col, unit=unit, alt=alt, line=line, solid=solid);
ldraw_lib__stud(line=0.2);
// file: s/3001s02.scad
use <../../lib.scad>
use <../../p/box4.scad>
use <../../p/box5.scad>
use <../../p/stud4.scad>
function ldraw_lib__s__3001s02() = [
// 0 ~Brick  2 x  4 without Top and Top Studs
// 0 Name: s\3001s02.dat
// 0 Author: Rene Rechthaler [Blechtaler]
// 0 !LDRAW_ORG Subpart UPDATE 2024-09
// 0 !LICENSE Licensed under CC BY 4.0 : see CAreadme.txt
// 
// 0 BFC CERTIFY CCW
  [0,"BFC","CERTIFY"],
  [0,"BFC","CCW"],
// 
// 0 !HISTORY 2023-11-20 [Blechtaler] made from 3001s01
// 0 !HISTORY 2024-10-27 [OrionP] Official Update 2024-09
// 
// 1 16 20 4 0 1 0 0 0 -5 0 0 0 1 stud4.dat
  [1,16,20,4,0,1,0,0,0,-5,0,0,0,1, ldraw_lib__stud4()],
// 1 16 0 4 0 1 0 0 0 -5 0 0 0 1 stud4.dat
  [1,16,0,4,0,1,0,0,0,-5,0,0,0,1, ldraw_lib__stud4()],
// 1 16 -20 4 0 1 0 0 0 -5 0 0 0 1 stud4.dat
  [1,16,-20,4,0,1,0,0,0,-5,0,0,0,1, ldraw_lib__stud4()],
// 0 BFC INVERTNEXT
  [0,"BFC","INVERTNEXT"],
// 1 16 0 24 0 36 0 0 0 -20 0 0 0 16 box5.dat
  [1,16,0,24,0,36,0,0,0,-20,0,0,0,16, ldraw_lib__box5()],
// 4 16 40 24 20 36 24 16 -36 24 16 -40 24 20
  [4,16,40,24,20,36,24,16,-36,24,16,-40,24,20],
// 4 16 -40 24 20 -36 24 16 -36 24 -16 -40 24 -20
  [4,16,-40,24,20,-36,24,16,-36,24,-16,-40,24,-20],
// 4 16 -40 24 -20 -36 24 -16 36 24 -16 40 24 -20
  [4,16,-40,24,-20,-36,24,-16,36,24,-16,40,24,-20],
// 4 16 40 24 -20 36 24 -16 36 24 16 40 24 20
  [4,16,40,24,-20,36,24,-16,36,24,16,40,24,20],
// 1 16 0 24 0 0 0 40 0 -24 0 -20 0 0 box4.dat
  [1,16,0,24,0,0,0,40,0,-24,0,-20,0,0, ldraw_lib__box4()],
];
module ldraw_lib__s__3001s02(step=0, col=false, unit=2/5, alt=false, line=0.2, solid=!$preview)
    makepoly(ldraw_lib__s__3001s02(), step=step, col=col, unit=unit, alt=alt, line=line, solid=solid);
ldraw_lib__s__3001s02(line=0.2);
// main file
use <../lib.scad>
use <s/3001s02.scad>
use <../p/stud.scad>
function ldraw_lib__60189p01() = [
// 0 Brick Braille 2 x 4 with 1 Stud (DOTS-1) with "A 1" Pattern
// 0 Name: 60189p01.dat
// 0 Author: Rene Rechthaler [Blechtaler]
// 0 !LDRAW_ORG Part UPDATE 2024-09
// 0 !LICENSE Licensed under CC BY 4.0 : see CAreadme.txt
// 
// 0 BFC CERTIFY CCW
  [0,"BFC","CERTIFY"],
  [0,"BFC","CCW"],
// 
// 0 !KEYWORDS ⠁ Unicode U+2801 (10241), Bricklink 60189pb01
// 0 !KEYWORDS Rebrickable 60189pr0001, Set 4000503, set 40722, set 40723
// 0 !KEYWORDS set 40724
// 
// 0 !HISTORY 2024-08-18 [MagFors] Changed orientation, added keywords
// 0 !HISTORY 2024-10-27 [OrionP] Official Update 2024-09
// 
// 1 16 0 0 0 -1 0 0 0 1 0 0 0 1 s\3001s02.dat
  [1,16,0,0,0,-1,0,0,0,1,0,0,0,1, ldraw_lib__s__3001s02()],
// 1 16 -30 0 -10 1 0 0 0 1 0 0 0 1 stud.dat
  [1,16,-30,0,-10,1,0,0,0,1,0,0,0,1, ldraw_lib__stud()],
// 
// 0 // Pattern
// 0 // Character
// 3 0 34.5 0 -8.585 34.5 0 -7.078 33.034 0 -6.452
  [3,0,34.5,0,-8.585,34.5,0,-7.078,33.034,0,-6.452],
// 4 0 28.181 0 -4.465 25.7 0 -4.705 34.5 0 -8.585 31.82 0 -5.945
  [4,0,28.181,0,-4.465,25.7,0,-4.705,34.5,0,-8.585,31.82,0,-5.945],
// 4 0 31.82 0 -2.999 31.82 0 -5.945 33.034 0 -6.452 33.034 0 -2.492
  [4,0,31.82,0,-2.999,31.82,0,-5.945,33.034,0,-6.452,33.034,0,-2.492],
// 3 0 31.82 0 -5.945 34.5 0 -8.585 33.034 0 -6.452
  [3,0,31.82,0,-5.945,34.5,0,-8.585,33.034,0,-6.452],
// 3 0 33.034 0 -2.492 34.5 0 -1.866 34.5 0 -.346
  [3,0,33.034,0,-2.492,34.5,0,-1.866,34.5,0,-.346],
// 3 0 33.034 0 -2.492 34.5 0 -.346 31.82 0 -2.999
  [3,0,33.034,0,-2.492,34.5,0,-.346,31.82,0,-2.999],
// 4 0 34.5 0 -.346 25.7 0 -4.226 28.181 0 -4.465 31.82 0 -2.999
  [4,0,34.5,0,-.346,25.7,0,-4.226,28.181,0,-4.465,31.82,0,-2.999],
// 3 0 28.181 0 -4.465 25.7 0 -4.226 25.7 0 -4.705
  [3,0,28.181,0,-4.465,25.7,0,-4.226,25.7,0,-4.705],
// 4 0 25.7 0 7.052 26.701 0 4 27.941 0 4.346 27.368 0 6.133
  [4,0,25.7,0,7.052,26.701,0,4,27.941,0,4.346,27.368,0,6.133],
// 4 0 34.5 0 6.133 34.5 0 7.546 25.7 0 7.546 27.368 0 6.133
  [4,0,34.5,0,6.133,34.5,0,7.546,25.7,0,7.546,27.368,0,6.133],
// 3 0 25.7 0 7.546 25.7 0 7.052 27.368 0 6.133
  [3,0,25.7,0,7.546,25.7,0,7.052,27.368,0,6.133],
// 0 // Background
// 4 16 34.5 0 -7.078 34.5 0 -1.866 33.034 0 -2.492 33.034 0 -6.452
  [4,16,34.5,0,-7.078,34.5,0,-1.866,33.034,0,-2.492,33.034,0,-6.452],
// 3 16 31.82 0 -2.999 28.181 0 -4.465 31.82 0 -5.945
  [3,16,31.82,0,-2.999,28.181,0,-4.465,31.82,0,-5.945],
// 4 16 27.368 0 6.133 27.941 0 4.346 34.5 0 -.346 34.5 0 6.133
  [4,16,27.368,0,6.133,27.941,0,4.346,34.5,0,-.346,34.5,0,6.133],
// 4 16 34.5 0 -.346 27.941 0 4.346 26.701 0 4 25.7 0 -4.226
  [4,16,34.5,0,-.346,27.941,0,4.346,26.701,0,4,25.7,0,-4.226],
// 4 16 -40 0 20 25.7 0 -4.226 26.701 0 4 25.7 0 7.052
  [4,16,-40,0,20,25.7,0,-4.226,26.701,0,4,25.7,0,7.052],
// 4 16 25.7 0 -4.705 -40 0 -20 40 0 -20 34.5 0 -8.585
  [4,16,25.7,0,-4.705,-40,0,-20,40,0,-20,34.5,0,-8.585],
// 3 16 40 0 -20 34.5 0 -7.078 34.5 0 -8.585
  [3,16,40,0,-20,34.5,0,-7.078,34.5,0,-8.585],
// 3 16 40 0 -20 34.5 0 -1.866 34.5 0 -7.078
  [3,16,40,0,-20,34.5,0,-1.866,34.5,0,-7.078],
// 4 16 -40 0 20 -40 0 -20 25.7 0 -4.705 25.7 0 -4.226
  [4,16,-40,0,20,-40,0,-20,25.7,0,-4.705,25.7,0,-4.226],
// 3 16 40 0 -20 34.5 0 -.346 34.5 0 -1.866
  [3,16,40,0,-20,34.5,0,-.346,34.5,0,-1.866],
// 3 16 34.5 0 6.133 40 0 20 34.5 0 7.546
  [3,16,34.5,0,6.133,40,0,20,34.5,0,7.546],
// 4 16 34.5 0 6.133 34.5 0 -.346 40 0 -20 40 0 20
  [4,16,34.5,0,6.133,34.5,0,-.346,40,0,-20,40,0,20],
// 3 16 -40 0 20 25.7 0 7.052 25.7 0 7.546
  [3,16,-40,0,20,25.7,0,7.052,25.7,0,7.546],
// 4 16 34.5 0 7.546 40 0 20 -40 0 20 25.7 0 7.546
  [4,16,34.5,0,7.546,40,0,20,-40,0,20,25.7,0,7.546],
];
module ldraw_lib__60189p01(step=0, col=false, unit=2/5, alt=false, line=0.2, solid=!$preview)
    makepoly(ldraw_lib__60189p01(), step=step, col=col, unit=unit, alt=alt, line=line, solid=solid);
ldraw_lib__60189p01(line=0.2);
